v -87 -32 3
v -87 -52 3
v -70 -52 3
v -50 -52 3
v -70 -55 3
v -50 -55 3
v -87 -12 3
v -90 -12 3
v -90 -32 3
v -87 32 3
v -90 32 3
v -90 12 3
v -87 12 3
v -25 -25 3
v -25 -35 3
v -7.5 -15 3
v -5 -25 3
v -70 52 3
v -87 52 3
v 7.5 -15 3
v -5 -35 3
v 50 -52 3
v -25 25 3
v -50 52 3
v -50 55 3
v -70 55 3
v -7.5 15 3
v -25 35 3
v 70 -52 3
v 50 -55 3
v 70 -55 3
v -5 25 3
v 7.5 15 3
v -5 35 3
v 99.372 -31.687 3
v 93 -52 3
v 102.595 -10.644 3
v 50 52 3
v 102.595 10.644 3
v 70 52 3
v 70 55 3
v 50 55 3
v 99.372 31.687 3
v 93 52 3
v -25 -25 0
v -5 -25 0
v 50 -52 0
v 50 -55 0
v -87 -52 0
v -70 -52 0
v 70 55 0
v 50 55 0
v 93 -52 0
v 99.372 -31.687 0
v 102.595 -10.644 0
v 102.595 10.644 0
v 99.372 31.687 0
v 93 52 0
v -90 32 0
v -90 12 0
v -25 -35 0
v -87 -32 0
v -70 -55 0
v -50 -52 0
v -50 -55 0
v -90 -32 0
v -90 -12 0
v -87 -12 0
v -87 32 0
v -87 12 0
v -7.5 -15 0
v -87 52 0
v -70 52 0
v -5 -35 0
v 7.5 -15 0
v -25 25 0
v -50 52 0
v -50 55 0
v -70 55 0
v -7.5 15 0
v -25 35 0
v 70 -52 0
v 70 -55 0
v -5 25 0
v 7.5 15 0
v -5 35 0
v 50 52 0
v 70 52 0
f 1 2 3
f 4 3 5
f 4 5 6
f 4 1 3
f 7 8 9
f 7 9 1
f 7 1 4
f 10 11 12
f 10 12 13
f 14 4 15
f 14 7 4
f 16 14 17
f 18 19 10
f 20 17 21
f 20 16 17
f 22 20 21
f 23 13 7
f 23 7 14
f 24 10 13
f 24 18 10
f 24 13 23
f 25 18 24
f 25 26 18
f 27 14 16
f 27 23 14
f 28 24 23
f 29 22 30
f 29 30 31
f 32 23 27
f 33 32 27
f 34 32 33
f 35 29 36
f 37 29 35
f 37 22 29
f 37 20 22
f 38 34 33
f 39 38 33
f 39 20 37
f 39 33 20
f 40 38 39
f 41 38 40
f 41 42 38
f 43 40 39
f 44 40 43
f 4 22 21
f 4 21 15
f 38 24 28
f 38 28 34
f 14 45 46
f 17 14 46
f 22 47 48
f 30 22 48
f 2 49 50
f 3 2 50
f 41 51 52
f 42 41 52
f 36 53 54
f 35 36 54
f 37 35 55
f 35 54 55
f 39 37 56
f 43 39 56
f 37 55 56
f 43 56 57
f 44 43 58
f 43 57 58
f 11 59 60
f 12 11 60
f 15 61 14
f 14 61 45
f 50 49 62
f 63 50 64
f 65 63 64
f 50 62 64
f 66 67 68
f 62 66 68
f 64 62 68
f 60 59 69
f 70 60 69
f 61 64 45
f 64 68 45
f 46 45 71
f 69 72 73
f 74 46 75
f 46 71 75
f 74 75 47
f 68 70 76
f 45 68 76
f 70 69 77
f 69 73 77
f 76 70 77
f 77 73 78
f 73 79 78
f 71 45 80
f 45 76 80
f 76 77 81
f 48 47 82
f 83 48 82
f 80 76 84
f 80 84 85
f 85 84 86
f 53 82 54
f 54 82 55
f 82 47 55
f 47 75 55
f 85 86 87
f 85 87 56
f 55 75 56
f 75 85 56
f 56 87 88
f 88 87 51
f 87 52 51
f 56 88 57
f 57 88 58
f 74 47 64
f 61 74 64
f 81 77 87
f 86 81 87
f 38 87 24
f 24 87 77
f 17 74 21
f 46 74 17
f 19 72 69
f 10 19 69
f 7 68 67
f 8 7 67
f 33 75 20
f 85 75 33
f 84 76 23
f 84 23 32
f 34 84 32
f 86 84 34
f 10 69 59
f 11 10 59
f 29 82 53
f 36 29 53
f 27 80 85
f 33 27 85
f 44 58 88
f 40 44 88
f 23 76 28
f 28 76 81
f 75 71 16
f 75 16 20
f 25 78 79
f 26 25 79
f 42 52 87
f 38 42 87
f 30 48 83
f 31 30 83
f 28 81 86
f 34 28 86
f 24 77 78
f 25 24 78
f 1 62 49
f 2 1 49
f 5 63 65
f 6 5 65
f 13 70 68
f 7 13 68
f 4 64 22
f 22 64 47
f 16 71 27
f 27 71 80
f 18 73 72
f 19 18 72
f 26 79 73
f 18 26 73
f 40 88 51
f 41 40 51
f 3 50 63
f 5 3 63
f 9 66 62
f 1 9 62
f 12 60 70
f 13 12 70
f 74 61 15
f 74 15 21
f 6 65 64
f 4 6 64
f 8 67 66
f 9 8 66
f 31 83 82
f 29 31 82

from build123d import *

# Parameters (mm, degrees)
SKETCH1_W           = 15
SKETCH1_H           = 30
SKETCH1_W_2         = 20
SKETCH1_H_2         = 10
BOSS_EXTRUDE1_DEPTH = 3


with BuildPart() as part:
    # Sketch1 → Boss-Extrude1 (new body)
    with BuildSketch(Plane.XY):
        with BuildLine():
            Line((-50, 52), (-50, 55))
            Line((-50, 55), (-70, 55))
            Line((-70, 55), (-70, 52))
            Line((-70, 52), (-87, 52))
            Line((-87, 52), (-87, 32))
            Line((-87, 32), (-90, 32))
            Line((-90, 32), (-90, 12))
            Line((-90, 12), (-87, 12))
            Line((-87, 12), (-87, -12))
            Line((-87, -12), (-90, -12))
            Line((-90, -12), (-90, -32))
            Line((-90, -32), (-87, -32))
            Line((-87, -32), (-87, -52))
            Line((-87, -52), (-70, -52))
            Line((-70, -52), (-70, -55))
            Line((-70, -55), (-50, -55))
            Line((-50, -55), (-50, -52))
            Line((-50, -52), (50, -52))
            Line((50, -52), (50, -55))
            Line((50, -55), (70, -55))
            Line((70, -55), (70, -52))
            Line((70, -52), (90, -52))
            Line((90, -52), (93, -52))
            ThreePointArc((93, -52), (103, 0), (93, 52))
            Line((93, 52), (90, 52))
            Line((90, 52), (70, 52))
            Line((70, 52), (70, 55))
            Line((70, 55), (50, 55))
            Line((50, 55), (50, 52))
            Line((50, 52), (-50, 52))
        make_face()
        Rectangle(SKETCH1_W, SKETCH1_H, mode=Mode.SUBTRACT)
        with Locations((-15, 30)):
            Rectangle(SKETCH1_W_2, SKETCH1_H_2, mode=Mode.SUBTRACT)
        with Locations((-15, -30)):
            Rectangle(SKETCH1_W_2, SKETCH1_H_2, mode=Mode.SUBTRACT)
    extrude(amount=BOSS_EXTRUDE1_DEPTH)


solid = part.part
